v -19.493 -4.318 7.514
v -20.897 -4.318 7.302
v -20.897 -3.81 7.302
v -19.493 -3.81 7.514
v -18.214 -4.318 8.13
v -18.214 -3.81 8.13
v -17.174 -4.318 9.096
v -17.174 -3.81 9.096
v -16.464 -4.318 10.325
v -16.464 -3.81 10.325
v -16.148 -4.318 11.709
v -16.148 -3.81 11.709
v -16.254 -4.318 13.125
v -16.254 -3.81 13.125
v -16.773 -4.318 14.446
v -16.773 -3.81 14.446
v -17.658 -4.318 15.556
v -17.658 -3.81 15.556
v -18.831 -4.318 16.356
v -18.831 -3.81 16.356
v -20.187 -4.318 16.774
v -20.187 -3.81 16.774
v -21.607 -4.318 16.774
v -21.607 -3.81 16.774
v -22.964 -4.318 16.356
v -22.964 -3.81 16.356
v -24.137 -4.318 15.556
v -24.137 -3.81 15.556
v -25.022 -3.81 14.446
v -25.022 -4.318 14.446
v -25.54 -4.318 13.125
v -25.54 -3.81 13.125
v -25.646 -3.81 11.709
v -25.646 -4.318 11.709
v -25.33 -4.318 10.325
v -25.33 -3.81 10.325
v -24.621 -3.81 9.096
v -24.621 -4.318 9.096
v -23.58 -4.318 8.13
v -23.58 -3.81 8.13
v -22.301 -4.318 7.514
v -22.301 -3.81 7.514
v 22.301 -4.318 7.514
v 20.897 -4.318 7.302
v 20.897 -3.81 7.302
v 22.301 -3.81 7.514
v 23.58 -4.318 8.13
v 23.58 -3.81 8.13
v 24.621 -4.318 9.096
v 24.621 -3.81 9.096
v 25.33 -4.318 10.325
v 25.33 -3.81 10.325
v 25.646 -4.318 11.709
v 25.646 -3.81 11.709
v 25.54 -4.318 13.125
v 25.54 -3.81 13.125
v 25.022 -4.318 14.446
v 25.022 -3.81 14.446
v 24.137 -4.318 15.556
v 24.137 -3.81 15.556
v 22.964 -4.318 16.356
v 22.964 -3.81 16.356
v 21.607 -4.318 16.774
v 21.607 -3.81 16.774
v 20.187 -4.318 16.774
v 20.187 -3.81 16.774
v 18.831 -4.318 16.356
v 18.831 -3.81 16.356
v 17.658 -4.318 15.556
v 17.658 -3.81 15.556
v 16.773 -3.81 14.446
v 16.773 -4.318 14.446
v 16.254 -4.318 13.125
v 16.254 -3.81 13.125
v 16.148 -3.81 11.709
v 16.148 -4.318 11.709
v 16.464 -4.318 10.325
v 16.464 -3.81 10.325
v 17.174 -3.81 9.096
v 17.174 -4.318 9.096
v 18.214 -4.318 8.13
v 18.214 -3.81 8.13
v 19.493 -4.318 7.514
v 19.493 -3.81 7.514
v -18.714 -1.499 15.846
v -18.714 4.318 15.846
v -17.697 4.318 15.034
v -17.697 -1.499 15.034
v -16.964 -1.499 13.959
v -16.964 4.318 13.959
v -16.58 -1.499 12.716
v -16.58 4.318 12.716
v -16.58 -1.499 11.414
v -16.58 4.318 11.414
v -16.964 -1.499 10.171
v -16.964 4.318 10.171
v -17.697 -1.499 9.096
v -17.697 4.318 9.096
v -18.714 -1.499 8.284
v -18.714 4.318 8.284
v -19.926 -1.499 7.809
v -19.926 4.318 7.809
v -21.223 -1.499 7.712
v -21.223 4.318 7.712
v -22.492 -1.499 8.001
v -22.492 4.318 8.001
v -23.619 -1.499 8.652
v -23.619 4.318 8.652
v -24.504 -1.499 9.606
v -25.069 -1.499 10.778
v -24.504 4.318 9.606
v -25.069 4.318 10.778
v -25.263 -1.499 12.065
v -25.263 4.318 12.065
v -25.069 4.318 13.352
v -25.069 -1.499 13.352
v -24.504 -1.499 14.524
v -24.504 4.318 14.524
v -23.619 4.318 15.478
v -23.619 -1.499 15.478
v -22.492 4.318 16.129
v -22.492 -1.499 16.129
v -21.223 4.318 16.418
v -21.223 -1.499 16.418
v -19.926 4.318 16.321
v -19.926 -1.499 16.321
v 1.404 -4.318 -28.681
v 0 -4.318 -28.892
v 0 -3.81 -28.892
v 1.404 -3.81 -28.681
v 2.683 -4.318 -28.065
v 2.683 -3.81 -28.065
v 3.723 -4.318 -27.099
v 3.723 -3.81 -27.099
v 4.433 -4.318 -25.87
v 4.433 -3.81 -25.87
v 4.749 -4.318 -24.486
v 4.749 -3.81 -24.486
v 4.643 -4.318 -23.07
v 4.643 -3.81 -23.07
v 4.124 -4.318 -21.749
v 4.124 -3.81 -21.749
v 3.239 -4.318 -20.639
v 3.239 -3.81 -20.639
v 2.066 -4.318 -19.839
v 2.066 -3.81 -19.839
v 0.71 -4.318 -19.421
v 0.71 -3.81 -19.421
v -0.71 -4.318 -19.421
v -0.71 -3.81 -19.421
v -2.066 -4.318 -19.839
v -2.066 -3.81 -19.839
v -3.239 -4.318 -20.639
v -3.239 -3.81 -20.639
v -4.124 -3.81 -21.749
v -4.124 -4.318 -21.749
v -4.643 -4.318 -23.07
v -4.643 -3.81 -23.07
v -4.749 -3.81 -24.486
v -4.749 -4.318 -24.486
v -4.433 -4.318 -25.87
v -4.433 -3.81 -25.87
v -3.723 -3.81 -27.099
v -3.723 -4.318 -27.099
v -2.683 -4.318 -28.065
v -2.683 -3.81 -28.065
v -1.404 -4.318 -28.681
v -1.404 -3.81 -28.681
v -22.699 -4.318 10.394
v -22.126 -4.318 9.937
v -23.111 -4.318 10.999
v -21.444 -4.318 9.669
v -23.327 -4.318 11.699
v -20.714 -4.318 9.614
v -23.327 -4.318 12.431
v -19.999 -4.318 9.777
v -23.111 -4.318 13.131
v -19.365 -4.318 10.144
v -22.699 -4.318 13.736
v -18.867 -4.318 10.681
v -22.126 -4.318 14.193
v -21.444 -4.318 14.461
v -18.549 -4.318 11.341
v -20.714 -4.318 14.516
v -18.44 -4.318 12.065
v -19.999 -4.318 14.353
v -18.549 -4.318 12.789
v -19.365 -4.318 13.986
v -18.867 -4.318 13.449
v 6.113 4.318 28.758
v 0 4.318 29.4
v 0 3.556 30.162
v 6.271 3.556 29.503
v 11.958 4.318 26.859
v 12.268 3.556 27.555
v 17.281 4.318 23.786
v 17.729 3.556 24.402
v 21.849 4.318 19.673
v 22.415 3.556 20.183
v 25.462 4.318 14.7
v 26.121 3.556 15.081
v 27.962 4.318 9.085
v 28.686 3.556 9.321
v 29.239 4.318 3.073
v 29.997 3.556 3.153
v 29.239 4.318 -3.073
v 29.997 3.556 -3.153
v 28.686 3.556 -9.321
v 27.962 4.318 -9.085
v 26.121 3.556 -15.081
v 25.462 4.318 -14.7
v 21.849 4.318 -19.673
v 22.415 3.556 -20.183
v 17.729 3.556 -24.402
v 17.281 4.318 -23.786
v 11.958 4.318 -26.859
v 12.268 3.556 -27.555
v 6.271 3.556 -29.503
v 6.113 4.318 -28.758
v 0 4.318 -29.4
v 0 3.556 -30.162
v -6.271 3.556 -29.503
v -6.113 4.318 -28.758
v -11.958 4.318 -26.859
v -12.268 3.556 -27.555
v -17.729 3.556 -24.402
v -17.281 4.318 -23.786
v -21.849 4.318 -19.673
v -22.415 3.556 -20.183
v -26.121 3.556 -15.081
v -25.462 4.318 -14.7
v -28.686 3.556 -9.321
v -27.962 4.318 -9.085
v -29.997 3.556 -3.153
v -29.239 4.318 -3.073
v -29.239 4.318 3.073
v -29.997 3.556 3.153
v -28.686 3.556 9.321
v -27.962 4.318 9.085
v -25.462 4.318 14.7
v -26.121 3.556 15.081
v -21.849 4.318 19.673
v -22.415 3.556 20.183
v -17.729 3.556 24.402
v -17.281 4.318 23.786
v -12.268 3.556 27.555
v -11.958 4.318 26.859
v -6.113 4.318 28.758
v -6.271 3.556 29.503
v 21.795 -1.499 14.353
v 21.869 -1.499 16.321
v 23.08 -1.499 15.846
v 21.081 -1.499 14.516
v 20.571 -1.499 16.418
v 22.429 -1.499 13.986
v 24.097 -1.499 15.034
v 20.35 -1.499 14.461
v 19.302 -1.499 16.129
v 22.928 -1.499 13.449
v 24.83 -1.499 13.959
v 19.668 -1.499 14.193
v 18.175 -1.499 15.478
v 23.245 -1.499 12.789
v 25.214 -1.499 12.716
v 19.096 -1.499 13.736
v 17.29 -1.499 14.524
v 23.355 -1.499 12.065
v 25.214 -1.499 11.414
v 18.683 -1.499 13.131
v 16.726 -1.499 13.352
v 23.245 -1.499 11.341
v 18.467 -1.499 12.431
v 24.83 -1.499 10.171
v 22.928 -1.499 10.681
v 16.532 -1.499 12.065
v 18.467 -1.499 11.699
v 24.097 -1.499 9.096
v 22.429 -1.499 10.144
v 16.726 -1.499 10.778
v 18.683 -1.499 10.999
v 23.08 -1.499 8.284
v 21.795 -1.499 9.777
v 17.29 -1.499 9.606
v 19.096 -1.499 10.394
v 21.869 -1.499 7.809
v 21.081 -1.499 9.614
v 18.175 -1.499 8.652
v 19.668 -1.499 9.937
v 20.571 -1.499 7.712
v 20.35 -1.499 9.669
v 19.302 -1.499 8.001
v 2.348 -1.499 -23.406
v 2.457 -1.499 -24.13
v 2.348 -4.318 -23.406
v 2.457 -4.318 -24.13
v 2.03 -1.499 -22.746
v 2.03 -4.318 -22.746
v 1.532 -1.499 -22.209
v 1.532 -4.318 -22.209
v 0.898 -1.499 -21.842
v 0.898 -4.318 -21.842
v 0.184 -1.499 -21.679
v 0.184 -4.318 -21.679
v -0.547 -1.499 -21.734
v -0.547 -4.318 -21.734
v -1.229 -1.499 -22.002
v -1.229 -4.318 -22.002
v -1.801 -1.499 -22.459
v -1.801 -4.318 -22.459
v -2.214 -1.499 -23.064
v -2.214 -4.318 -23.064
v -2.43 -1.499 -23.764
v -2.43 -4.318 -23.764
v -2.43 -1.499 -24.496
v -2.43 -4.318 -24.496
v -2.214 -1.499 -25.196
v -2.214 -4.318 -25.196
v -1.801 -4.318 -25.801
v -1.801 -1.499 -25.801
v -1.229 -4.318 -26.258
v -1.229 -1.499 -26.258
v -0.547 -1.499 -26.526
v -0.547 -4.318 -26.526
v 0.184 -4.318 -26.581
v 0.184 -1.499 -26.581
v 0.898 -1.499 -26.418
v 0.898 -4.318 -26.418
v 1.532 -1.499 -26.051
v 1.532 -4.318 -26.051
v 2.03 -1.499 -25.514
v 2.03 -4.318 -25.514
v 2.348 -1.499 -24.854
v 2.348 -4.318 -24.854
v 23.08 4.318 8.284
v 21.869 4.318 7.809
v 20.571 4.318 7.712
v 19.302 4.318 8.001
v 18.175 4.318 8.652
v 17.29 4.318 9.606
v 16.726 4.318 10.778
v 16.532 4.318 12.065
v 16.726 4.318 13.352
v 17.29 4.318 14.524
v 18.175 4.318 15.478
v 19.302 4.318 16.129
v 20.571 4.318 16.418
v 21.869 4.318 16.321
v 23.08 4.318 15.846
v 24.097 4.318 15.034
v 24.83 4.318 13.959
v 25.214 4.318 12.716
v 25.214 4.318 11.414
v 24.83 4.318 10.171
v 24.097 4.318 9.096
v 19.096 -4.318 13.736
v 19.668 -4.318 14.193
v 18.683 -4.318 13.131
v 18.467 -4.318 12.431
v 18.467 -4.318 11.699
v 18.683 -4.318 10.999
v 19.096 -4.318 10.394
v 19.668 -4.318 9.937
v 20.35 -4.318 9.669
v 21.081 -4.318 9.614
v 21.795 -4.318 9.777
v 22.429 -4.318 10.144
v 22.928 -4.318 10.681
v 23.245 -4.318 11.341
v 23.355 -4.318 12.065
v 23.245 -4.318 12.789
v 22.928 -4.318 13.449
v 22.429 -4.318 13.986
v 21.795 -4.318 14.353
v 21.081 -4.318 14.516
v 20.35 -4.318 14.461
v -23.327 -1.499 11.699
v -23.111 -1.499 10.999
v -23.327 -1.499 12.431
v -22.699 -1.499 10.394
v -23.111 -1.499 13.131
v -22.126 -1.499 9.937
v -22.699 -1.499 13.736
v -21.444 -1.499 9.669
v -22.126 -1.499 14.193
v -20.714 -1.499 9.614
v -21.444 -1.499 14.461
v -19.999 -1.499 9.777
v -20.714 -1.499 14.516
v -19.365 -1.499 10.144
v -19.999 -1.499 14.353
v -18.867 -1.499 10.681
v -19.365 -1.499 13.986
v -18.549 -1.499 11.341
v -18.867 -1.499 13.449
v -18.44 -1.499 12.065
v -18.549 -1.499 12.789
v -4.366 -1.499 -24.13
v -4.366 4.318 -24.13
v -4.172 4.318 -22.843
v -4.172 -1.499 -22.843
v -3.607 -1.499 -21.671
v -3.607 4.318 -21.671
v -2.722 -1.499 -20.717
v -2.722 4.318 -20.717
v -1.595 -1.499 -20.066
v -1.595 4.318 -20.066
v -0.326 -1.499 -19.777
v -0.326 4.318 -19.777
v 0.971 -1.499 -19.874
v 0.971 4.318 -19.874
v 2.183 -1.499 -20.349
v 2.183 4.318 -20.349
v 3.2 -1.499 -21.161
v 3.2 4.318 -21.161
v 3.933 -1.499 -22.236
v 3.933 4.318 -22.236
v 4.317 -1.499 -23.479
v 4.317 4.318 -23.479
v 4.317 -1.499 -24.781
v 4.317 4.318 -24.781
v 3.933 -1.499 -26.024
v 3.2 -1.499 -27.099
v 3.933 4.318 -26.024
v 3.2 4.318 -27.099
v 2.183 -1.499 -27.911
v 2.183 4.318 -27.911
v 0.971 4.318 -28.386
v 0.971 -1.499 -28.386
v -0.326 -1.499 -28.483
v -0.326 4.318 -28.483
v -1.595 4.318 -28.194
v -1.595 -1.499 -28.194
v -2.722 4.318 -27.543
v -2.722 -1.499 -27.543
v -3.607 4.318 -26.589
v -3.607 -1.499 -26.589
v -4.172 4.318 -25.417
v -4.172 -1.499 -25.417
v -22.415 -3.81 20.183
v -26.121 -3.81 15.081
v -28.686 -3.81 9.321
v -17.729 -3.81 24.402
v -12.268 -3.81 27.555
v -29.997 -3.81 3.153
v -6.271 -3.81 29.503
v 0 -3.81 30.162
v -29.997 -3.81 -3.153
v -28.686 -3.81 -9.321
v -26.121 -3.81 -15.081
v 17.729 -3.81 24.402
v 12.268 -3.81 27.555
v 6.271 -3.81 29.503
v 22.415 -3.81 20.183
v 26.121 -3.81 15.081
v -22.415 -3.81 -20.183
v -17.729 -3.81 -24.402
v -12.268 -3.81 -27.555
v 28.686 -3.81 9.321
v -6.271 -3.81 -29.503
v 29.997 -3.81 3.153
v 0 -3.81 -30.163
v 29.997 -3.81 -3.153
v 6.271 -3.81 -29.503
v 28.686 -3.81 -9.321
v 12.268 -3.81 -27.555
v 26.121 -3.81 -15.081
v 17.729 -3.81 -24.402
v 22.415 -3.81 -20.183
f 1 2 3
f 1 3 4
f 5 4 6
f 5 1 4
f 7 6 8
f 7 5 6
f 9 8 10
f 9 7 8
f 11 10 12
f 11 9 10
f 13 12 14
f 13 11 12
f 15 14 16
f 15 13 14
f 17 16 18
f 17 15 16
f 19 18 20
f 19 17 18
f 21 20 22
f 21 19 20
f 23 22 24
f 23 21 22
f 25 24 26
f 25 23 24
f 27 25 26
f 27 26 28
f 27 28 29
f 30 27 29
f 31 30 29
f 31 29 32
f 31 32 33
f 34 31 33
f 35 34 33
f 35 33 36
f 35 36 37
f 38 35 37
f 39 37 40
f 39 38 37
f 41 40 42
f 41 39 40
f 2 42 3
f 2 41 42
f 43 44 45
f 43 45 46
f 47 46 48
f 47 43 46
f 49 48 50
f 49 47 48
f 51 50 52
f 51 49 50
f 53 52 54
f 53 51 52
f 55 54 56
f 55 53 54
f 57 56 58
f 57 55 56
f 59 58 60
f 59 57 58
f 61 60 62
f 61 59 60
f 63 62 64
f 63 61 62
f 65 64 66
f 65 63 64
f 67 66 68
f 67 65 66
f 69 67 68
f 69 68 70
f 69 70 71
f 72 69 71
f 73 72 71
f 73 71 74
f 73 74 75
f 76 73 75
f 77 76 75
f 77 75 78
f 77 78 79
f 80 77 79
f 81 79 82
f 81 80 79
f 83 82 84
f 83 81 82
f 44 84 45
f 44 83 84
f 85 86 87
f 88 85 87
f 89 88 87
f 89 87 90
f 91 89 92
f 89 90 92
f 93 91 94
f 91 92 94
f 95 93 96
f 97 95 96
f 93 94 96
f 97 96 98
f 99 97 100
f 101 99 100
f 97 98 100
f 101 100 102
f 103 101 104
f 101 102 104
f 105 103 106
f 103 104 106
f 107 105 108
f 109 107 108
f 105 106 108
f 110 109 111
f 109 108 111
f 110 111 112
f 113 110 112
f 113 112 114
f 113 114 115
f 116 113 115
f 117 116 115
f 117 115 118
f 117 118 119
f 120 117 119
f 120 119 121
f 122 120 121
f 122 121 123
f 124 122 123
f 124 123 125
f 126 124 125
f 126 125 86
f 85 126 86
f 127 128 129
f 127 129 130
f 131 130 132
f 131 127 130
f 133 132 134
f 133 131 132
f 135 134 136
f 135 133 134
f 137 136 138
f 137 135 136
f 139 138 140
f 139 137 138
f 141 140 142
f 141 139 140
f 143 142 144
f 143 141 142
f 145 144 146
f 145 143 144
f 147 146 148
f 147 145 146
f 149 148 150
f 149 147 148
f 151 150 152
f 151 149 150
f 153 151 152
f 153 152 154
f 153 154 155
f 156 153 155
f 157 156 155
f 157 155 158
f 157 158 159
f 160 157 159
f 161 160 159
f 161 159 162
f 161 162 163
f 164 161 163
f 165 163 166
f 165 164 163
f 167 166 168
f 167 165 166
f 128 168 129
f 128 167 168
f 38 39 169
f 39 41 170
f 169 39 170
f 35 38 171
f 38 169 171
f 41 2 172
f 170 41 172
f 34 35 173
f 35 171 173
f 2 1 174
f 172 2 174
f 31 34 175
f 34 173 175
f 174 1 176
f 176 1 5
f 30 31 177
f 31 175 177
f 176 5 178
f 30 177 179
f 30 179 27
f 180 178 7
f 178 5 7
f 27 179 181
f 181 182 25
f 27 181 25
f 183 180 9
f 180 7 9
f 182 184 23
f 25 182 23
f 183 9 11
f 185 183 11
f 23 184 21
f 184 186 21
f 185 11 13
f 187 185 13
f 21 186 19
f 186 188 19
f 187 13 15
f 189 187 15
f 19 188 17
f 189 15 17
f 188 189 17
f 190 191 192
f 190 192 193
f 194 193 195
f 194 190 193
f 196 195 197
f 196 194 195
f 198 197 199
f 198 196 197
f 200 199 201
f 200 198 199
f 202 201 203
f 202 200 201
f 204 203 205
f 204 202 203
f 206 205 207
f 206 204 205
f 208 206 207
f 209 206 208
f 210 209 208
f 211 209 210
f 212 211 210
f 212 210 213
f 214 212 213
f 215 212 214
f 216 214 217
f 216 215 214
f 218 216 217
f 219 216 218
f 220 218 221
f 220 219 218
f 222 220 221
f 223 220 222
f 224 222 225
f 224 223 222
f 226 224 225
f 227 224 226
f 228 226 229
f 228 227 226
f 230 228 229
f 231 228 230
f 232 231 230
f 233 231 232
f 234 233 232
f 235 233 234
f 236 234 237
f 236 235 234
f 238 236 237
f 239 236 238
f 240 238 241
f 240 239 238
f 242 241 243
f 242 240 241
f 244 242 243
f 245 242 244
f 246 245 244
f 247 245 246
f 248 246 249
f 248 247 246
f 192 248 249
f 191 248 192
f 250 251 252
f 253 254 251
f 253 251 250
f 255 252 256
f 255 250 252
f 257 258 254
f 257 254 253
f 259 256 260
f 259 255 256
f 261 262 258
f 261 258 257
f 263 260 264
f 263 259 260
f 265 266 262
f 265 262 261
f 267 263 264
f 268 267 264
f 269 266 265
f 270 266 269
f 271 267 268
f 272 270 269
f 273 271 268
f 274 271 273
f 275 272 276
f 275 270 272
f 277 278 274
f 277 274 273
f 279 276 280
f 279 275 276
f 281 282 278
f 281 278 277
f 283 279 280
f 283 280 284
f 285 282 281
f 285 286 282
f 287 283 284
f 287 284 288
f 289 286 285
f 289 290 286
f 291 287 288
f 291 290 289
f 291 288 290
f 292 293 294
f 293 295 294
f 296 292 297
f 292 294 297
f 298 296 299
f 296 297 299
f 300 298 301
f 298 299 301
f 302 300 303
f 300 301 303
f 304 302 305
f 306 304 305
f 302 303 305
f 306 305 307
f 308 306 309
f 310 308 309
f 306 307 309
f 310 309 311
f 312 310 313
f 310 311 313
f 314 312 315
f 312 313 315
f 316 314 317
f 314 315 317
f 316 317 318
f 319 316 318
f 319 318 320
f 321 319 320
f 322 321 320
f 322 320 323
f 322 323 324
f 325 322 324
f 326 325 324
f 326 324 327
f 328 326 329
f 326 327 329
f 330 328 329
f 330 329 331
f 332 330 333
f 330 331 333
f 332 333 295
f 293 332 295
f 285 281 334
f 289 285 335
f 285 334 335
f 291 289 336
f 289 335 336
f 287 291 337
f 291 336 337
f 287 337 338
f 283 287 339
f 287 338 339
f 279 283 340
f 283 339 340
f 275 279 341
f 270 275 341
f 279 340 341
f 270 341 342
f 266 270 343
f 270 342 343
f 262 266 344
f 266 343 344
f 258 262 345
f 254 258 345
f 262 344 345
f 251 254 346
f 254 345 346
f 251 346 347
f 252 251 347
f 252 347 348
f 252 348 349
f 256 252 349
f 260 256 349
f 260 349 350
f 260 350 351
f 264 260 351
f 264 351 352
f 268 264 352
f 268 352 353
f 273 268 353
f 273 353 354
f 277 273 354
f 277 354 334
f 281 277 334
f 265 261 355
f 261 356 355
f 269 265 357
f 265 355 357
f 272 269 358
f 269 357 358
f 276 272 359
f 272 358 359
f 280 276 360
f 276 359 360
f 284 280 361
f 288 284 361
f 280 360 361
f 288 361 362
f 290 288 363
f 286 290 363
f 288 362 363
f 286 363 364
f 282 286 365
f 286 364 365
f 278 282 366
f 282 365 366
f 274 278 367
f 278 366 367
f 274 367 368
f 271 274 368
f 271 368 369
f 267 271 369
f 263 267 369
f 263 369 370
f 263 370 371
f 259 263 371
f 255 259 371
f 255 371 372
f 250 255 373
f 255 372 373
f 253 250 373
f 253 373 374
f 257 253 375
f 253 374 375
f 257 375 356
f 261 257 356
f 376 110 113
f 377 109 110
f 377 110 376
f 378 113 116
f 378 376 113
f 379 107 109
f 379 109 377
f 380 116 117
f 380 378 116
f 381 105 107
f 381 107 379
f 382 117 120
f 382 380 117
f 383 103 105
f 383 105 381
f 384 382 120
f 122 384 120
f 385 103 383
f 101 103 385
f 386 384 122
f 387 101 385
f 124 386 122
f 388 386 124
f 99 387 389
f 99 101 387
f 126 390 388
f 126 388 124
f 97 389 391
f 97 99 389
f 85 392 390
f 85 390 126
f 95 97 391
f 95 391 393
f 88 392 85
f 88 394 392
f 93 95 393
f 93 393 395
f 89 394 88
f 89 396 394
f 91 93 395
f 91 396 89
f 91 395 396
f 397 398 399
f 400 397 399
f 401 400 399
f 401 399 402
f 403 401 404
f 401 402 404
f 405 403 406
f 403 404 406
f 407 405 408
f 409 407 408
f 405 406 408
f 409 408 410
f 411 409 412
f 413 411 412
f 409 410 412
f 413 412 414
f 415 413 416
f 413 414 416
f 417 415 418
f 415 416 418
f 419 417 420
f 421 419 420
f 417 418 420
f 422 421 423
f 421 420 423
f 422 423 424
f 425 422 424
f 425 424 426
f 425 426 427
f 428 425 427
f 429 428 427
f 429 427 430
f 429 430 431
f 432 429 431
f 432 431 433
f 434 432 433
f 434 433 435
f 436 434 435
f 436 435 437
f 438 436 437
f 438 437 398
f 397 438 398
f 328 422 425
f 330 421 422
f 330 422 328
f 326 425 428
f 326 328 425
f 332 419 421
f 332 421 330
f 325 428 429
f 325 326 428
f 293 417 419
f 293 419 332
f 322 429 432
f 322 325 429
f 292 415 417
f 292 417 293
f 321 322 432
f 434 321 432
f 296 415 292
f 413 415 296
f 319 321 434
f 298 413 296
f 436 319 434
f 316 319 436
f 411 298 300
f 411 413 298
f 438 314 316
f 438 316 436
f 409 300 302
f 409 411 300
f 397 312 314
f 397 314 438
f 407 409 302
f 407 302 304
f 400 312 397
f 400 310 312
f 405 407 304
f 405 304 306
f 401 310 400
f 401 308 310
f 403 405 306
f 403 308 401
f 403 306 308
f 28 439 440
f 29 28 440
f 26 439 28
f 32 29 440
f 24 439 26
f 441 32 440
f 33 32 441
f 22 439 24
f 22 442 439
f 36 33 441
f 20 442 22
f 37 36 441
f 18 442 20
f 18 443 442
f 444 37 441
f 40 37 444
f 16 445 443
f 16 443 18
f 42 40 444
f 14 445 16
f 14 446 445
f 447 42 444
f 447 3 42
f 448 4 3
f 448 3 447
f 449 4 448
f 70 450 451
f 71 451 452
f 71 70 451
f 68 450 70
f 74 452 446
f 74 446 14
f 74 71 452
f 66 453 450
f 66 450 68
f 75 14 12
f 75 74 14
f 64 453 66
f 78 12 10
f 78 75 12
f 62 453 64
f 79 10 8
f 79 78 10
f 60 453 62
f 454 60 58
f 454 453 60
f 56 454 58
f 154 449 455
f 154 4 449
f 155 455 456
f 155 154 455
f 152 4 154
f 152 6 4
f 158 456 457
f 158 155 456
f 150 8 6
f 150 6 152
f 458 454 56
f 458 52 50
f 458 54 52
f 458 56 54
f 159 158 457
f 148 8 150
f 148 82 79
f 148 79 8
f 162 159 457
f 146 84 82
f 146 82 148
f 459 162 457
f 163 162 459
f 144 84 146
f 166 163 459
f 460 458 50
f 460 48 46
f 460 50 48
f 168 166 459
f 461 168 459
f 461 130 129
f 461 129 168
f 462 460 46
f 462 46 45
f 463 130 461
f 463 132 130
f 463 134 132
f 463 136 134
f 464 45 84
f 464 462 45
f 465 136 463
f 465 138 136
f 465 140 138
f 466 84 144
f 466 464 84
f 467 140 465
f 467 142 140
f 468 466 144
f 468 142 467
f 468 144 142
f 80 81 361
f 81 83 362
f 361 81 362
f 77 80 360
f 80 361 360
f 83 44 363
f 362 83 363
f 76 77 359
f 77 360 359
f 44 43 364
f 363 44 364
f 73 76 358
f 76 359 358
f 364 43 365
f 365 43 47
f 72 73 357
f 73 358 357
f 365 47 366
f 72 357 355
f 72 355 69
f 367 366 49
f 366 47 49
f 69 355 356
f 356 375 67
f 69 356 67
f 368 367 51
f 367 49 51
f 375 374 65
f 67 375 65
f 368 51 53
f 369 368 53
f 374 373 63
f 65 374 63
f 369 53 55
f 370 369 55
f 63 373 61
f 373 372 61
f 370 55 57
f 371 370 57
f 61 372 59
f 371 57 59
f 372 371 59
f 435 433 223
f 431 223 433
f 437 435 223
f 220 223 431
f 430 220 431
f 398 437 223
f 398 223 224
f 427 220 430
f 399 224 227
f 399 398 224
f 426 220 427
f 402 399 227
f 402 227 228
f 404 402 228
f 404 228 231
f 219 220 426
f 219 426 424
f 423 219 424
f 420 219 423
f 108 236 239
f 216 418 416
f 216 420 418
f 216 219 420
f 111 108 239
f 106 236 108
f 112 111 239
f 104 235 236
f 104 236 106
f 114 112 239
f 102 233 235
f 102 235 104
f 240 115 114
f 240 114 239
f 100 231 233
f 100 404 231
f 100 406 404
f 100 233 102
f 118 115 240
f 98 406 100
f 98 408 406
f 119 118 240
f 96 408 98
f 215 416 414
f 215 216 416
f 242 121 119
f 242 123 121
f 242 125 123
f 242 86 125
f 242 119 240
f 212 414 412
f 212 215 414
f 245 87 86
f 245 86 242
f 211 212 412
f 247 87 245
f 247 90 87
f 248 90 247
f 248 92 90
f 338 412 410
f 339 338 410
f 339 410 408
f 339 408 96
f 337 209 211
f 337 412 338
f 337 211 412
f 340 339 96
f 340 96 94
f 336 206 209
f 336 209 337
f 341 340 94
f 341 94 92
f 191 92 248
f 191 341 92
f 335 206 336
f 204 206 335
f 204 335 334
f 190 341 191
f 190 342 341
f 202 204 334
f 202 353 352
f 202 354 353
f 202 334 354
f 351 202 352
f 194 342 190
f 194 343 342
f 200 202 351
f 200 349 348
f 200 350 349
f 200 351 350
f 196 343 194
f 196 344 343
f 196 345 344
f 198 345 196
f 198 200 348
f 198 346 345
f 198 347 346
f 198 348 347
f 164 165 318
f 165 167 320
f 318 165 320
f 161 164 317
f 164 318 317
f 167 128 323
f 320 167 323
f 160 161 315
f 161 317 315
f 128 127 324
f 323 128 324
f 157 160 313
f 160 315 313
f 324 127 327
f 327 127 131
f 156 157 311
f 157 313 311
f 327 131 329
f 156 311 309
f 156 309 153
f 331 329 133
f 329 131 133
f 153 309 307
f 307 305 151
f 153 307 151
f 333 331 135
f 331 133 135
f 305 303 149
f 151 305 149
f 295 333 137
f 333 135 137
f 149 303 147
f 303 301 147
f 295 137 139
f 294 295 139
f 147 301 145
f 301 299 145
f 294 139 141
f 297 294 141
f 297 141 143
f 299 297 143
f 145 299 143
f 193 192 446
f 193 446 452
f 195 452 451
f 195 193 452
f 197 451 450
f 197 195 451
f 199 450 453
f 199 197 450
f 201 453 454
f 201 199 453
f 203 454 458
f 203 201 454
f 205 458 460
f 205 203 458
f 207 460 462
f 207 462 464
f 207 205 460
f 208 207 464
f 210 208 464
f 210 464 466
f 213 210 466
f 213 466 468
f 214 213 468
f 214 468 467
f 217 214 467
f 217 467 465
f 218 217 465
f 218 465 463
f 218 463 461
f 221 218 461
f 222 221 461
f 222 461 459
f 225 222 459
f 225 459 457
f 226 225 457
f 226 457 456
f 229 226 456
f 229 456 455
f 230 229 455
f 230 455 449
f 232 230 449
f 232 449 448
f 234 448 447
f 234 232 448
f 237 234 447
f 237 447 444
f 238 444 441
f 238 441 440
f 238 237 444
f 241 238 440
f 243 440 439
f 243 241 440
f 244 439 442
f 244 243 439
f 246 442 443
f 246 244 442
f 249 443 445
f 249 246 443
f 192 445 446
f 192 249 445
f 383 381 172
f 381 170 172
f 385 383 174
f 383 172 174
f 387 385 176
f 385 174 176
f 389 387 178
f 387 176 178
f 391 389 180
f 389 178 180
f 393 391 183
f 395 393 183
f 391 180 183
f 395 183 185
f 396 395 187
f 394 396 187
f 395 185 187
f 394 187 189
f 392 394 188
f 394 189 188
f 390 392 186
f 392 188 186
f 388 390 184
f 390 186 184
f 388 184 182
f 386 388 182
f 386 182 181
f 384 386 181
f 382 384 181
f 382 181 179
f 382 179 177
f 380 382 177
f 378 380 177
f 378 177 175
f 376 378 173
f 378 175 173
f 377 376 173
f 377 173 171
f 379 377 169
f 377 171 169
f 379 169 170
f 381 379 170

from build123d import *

# Parameters (mm, degrees)
SKETCH1_R                                      = 30.1625
EXTRUDE1_DEPTH                                 = 4.318
CBORE_FOR_8_SOCKET_HEAD_CAP_SCREW1_D           = 4.9149
CBORE_FOR_8_SOCKET_HEAD_CAP_SCREW1_CBORE_D     = 8.73125
CBORE_FOR_8_SOCKET_HEAD_CAP_SCREW1_CBORE_DEPTH = 5.8166
CIRPATTERN1_COUNT                              = 3
SKETCH5_R                                      = 30.1625
SKETCH5_R_2                                    = 4.7625
CUT_EXTRUDE1_DEPTH                             = 0.508
CHAMFER1_SIZE                                  = 0.762


with BuildPart() as part:
    # Sketch1 → Extrude1 (new body, symmetric)
    with BuildSketch(Plane(origin=(0, 0, 0), x_dir=(1, 0, 0), z_dir=(0, 1, 0))):
        with Locations(Location((0, 0, 0), (0, 0, 270))):  # turned: the seam where the file's is
            Circle(SKETCH1_R)
    extrude(amount=EXTRUDE1_DEPTH, both=True)

    # CBORE for _8 Socket Head Cap Screw1 (through all)
    with Locations(Plane(origin=(0, 4.318, 0), x_dir=(-1, 0, 0), z_dir=(0, 1, 0))):
        with Locations((0, -24.13)):
            cbore_for_8_socket_head_cap_screw1 = CounterBoreHole(CBORE_FOR_8_SOCKET_HEAD_CAP_SCREW1_D / 2, CBORE_FOR_8_SOCKET_HEAD_CAP_SCREW1_CBORE_D / 2, CBORE_FOR_8_SOCKET_HEAD_CAP_SCREW1_CBORE_DEPTH)

    # CirPattern1: CBORE for _8 Socket Head Cap Screw1 ×3 about axis
    cirpattern1_axis = Axis((0, 0, 0), (0, 1, 0))
    for i in range(1, CIRPATTERN1_COUNT):
        add(cbore_for_8_socket_head_cap_screw1.rotate(cirpattern1_axis, i * 360 / CIRPATTERN1_COUNT), mode=Mode.SUBTRACT)

    # Sketch5 → Cut-Extrude1 (cut)
    with BuildSketch(Plane.XZ.offset(4.318)):
        with Locations(Location((0, 0, 0), (0, 0, 270))):  # turned: the seam where the file's is
            Circle(SKETCH5_R)
        with Locations(Location((-20.897192993, 12.065, 0), (0, 0, 270))):  # turned: the seam where the file's is
            Circle(SKETCH5_R_2, mode=Mode.SUBTRACT)
        with Locations(Location((0, -24.13, 0), (0, 0, 270))):  # turned: the seam where the file's is
            Circle(SKETCH5_R_2, mode=Mode.SUBTRACT)
        with Locations(Location((20.897192993, 12.065, 0), (0, 0, 270))):  # turned: the seam where the file's is
            Circle(SKETCH5_R_2, mode=Mode.SUBTRACT)
    extrude(amount=-CUT_EXTRUDE1_DEPTH, mode=Mode.SUBTRACT)

    # Chamfer1
    chamfer1_edges = [part.edges().sort_by_distance(p)[0] for p in [
        (0, 4.318, -30.1625),
    ]]
    chamfer(chamfer1_edges, length=CHAMFER1_SIZE)


solid = part.part
